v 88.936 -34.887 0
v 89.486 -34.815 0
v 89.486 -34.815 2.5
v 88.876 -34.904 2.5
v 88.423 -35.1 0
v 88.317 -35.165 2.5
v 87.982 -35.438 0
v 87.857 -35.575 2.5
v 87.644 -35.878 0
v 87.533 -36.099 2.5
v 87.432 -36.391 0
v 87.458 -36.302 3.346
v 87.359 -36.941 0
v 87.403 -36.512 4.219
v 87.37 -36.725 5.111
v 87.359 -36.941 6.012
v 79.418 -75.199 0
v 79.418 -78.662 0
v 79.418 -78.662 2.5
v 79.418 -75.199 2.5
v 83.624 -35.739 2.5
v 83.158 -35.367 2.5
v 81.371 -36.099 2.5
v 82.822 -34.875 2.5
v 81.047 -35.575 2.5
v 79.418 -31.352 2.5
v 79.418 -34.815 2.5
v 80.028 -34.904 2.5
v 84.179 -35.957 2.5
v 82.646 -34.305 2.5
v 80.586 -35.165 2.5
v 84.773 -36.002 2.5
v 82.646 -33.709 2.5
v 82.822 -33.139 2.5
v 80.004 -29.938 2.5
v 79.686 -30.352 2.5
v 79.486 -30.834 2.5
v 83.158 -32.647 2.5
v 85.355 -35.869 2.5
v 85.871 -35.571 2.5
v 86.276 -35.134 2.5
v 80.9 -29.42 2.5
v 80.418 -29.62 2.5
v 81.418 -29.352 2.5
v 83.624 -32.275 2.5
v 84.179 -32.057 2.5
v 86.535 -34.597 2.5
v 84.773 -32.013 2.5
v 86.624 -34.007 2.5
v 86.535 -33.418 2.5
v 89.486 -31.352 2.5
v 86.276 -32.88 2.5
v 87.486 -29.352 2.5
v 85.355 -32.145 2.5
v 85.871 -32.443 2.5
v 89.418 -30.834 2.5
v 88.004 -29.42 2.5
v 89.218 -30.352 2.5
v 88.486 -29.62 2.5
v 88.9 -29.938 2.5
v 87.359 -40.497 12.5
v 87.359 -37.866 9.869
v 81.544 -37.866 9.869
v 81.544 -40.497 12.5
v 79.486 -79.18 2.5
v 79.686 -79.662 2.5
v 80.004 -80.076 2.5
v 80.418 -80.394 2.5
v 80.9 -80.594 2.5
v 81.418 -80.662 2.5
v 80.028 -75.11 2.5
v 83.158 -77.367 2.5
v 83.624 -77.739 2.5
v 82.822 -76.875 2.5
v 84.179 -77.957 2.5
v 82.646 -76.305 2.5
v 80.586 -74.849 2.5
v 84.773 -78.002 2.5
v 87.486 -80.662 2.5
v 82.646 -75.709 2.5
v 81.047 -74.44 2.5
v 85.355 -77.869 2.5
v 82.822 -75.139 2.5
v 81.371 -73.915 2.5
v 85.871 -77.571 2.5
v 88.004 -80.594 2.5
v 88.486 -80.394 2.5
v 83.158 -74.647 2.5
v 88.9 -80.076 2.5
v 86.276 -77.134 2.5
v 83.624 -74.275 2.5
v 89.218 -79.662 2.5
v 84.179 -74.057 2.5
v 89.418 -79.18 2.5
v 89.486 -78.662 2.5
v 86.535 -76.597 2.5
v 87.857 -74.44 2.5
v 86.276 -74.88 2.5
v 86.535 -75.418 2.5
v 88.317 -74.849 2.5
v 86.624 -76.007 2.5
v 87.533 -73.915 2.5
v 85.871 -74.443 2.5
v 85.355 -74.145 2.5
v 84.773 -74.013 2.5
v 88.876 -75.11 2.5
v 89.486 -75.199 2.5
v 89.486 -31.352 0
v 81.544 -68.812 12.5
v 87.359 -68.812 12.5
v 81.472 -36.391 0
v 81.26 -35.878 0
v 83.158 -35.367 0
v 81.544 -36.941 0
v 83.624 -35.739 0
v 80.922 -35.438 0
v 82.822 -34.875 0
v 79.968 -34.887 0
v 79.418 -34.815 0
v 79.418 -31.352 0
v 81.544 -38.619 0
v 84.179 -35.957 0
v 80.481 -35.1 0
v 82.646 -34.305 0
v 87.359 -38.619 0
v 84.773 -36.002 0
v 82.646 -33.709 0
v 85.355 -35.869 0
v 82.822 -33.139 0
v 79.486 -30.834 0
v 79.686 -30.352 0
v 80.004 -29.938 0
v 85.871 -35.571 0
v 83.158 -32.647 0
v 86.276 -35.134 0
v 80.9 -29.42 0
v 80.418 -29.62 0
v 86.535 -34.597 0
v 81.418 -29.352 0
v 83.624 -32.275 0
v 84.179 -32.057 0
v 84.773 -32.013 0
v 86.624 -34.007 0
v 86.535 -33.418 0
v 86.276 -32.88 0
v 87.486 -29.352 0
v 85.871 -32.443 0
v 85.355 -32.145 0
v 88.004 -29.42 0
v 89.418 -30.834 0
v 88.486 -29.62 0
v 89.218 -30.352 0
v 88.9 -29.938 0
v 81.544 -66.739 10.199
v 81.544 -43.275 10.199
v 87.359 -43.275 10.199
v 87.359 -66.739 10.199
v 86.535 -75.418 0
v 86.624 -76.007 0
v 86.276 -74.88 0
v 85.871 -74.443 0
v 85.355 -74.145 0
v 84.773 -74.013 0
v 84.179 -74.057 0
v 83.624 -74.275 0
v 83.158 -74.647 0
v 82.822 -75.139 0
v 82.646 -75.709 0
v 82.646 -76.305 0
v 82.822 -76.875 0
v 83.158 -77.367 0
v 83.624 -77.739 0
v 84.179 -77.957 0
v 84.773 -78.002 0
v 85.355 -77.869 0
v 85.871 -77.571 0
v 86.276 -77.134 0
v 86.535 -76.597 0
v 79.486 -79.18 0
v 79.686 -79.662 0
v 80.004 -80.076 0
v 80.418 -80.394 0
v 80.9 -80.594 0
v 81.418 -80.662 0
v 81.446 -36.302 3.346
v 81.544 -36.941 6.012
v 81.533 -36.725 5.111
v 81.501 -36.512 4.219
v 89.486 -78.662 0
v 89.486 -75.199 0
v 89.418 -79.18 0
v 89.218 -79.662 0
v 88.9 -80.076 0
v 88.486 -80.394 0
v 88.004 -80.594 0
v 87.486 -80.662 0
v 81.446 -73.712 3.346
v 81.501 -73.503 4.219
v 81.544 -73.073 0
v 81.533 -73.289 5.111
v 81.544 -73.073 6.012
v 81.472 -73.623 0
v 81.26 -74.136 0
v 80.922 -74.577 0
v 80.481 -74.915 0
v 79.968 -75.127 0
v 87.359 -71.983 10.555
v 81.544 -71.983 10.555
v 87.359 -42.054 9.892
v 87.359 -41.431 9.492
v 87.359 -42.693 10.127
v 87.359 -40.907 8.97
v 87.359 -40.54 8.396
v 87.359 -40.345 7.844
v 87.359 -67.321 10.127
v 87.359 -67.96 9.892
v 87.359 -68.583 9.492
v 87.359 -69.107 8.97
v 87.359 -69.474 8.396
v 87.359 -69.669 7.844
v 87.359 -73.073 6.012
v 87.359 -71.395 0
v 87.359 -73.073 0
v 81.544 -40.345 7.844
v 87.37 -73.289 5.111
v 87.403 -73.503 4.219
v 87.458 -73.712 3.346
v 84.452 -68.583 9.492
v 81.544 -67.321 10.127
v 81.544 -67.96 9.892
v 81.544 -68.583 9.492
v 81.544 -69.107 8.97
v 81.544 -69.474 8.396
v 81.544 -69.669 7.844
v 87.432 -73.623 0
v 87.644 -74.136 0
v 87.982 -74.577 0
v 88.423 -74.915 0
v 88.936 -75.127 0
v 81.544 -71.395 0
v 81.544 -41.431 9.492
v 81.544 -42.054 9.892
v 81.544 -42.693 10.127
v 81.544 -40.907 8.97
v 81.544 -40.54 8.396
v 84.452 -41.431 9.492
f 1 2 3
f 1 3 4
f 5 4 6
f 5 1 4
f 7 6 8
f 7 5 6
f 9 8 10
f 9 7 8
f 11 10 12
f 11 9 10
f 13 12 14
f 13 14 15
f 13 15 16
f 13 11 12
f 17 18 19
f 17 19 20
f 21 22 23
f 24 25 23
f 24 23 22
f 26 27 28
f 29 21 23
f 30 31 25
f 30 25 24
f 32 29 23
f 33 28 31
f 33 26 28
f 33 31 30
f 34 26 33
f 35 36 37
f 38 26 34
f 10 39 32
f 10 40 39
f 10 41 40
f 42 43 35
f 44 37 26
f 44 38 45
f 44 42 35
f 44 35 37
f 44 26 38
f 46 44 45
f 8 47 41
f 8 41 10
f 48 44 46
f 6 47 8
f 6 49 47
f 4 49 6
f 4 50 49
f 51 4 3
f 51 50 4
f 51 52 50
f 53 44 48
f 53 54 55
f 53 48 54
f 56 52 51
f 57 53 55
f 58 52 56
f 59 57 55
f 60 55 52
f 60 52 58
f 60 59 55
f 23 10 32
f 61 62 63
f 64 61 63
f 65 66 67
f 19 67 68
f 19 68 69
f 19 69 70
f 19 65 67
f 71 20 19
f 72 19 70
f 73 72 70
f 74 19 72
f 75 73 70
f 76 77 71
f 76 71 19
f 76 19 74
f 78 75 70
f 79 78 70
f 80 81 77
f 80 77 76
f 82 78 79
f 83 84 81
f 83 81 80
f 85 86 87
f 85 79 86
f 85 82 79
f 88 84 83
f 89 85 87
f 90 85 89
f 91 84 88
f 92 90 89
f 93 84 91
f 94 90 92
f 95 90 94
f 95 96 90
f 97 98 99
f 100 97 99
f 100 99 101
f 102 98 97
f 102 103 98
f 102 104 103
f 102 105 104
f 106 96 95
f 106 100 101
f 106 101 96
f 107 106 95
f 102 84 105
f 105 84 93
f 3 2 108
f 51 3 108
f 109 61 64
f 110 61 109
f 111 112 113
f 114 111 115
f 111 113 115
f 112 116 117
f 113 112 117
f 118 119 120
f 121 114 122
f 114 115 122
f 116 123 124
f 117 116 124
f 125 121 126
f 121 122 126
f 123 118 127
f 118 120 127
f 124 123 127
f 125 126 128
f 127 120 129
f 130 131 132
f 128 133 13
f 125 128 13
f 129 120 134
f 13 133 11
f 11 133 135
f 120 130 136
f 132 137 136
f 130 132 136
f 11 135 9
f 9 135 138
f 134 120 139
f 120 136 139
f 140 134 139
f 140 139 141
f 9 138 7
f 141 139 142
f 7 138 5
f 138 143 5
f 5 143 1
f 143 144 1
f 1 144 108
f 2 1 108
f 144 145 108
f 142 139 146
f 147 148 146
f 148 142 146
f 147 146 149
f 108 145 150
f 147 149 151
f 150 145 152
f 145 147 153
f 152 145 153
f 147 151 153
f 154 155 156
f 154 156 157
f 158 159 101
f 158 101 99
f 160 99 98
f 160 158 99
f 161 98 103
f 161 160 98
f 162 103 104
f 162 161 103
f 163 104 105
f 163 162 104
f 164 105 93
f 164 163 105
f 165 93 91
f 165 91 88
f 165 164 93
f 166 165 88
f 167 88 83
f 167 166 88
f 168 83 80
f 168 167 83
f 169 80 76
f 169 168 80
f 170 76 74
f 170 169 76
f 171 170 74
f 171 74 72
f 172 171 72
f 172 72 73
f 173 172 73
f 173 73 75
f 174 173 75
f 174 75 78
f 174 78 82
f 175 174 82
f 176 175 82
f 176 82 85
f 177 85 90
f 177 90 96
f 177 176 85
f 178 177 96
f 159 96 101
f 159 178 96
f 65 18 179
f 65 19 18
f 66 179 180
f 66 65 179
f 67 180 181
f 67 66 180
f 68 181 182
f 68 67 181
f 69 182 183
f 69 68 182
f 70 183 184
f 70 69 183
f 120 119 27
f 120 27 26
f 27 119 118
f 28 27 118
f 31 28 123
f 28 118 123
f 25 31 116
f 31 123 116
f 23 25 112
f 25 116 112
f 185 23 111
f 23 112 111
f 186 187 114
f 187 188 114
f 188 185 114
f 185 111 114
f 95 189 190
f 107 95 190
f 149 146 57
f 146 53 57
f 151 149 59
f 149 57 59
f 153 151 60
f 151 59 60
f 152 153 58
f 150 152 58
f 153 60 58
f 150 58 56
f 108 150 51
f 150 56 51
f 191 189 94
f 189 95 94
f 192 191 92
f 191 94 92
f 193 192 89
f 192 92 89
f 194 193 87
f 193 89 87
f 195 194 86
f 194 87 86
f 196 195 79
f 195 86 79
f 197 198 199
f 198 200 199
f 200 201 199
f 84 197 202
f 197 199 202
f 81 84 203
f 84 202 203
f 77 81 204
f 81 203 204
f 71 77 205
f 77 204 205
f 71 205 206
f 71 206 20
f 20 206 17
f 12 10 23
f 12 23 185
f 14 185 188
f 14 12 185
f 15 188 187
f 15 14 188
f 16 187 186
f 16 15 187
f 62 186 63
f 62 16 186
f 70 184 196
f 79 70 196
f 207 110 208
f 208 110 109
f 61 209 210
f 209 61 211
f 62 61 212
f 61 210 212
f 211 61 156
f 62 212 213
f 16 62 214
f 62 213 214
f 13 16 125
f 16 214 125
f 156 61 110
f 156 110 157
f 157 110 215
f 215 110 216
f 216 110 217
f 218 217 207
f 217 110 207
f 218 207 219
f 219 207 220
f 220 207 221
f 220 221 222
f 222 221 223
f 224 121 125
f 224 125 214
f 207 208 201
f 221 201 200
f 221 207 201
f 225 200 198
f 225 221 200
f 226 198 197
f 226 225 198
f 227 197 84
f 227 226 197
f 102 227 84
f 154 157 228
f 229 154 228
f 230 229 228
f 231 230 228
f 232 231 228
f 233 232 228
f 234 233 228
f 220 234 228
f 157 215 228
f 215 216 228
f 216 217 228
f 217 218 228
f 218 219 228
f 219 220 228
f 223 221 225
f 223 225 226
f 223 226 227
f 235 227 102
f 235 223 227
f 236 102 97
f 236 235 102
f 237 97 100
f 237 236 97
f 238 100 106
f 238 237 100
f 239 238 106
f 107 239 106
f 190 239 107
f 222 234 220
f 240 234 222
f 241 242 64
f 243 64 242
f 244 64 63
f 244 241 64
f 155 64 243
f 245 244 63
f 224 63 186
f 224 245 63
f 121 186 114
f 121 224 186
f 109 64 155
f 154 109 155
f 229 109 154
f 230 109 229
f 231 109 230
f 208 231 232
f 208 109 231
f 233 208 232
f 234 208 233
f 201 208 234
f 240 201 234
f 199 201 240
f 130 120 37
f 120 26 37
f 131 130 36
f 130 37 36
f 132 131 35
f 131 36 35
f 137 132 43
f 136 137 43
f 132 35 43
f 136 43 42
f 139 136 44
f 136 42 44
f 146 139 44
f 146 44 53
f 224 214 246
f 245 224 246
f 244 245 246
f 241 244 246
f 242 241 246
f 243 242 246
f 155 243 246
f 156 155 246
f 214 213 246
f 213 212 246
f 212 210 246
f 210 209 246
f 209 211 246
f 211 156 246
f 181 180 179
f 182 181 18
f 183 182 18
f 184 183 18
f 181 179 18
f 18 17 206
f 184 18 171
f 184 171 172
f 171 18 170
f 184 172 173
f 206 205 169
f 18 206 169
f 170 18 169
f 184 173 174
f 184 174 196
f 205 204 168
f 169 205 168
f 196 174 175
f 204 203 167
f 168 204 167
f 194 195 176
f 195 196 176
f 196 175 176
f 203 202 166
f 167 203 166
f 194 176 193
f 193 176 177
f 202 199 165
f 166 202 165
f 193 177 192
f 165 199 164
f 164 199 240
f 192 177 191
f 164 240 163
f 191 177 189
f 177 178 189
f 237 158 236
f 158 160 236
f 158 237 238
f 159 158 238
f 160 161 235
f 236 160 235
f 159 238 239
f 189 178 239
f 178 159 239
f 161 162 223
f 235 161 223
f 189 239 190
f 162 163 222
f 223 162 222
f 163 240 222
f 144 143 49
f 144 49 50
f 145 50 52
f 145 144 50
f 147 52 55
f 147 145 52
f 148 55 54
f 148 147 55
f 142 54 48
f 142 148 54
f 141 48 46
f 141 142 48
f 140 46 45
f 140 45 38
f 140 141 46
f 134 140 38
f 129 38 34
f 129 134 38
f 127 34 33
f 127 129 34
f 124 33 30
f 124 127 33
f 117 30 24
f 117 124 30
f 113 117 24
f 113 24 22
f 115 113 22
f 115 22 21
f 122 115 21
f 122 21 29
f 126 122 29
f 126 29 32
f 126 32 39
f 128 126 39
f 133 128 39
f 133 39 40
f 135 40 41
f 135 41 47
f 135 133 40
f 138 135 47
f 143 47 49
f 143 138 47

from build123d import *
from OCP.BRepFilletAPI import BRepFilletAPI_MakeChamfer

# Parameters (mm, degrees)
SKETCH_1_W               = 10.068208361
SKETCH_1_H               = 51.310344827
SKETCH_1_R               = 2
EXTRUDE_1_DEPTH          = 2.5
EXTRUDE_2_DEPTH          = 10.068208362
CUT_EXTRUDE_1_DEPTH      = 83.243670079
CUT_EXTRUDE_1_DEPTH_BACK = 83.243670079
CUT_EXTRUDE_2_DEPTH      = 122.121367623
CUT_EXTRUDE_2_DEPTH_BACK = 122.121367623
FILLET_2_R               = 2
CHAMFER_2_SIZE           = 2
CHAMFER_2_SIZE2          = 2.70532723


with BuildPart() as part:
    # 草图1 → 凸台-拉伸1 (new body)
    with BuildSketch(Plane.XY):
        with Locations((84.451834639, -55.007101597)):
            Rectangle(SKETCH_1_W, SKETCH_1_H)
        with Locations((84.623869854, -34.007101596)):
            Circle(SKETCH_1_R, mode=Mode.SUBTRACT)
        with Locations((84.623869854, -76.007101596)):
            Circle(SKETCH_1_R, mode=Mode.SUBTRACT)
    extrude(amount=EXTRUDE_1_DEPTH)

    # 草图2 → 凸台-拉伸2 (add)
    with BuildSketch(Plane(origin=(89.485938819, 0, 0), x_dir=(0, 0, -1), z_dir=(1, 0, 0))):
        Polygon((-12.5, -71.517171054), (-2.5, -73.914822505), (-2.5, -36.099380688), (-12.5, -38.497032139), align=None)
    extrude(amount=-EXTRUDE_2_DEPTH)

    # 草图3 → 切除-拉伸1 (cut, two sides: drawn at the far end of the back side and taken through both)
    with BuildSketch(Plane(origin=(89.485938819, 0, 0), x_dir=(0, 0, -1), z_dir=(1, 0, 0)).offset(-CUT_EXTRUDE_1_DEPTH_BACK)):
        Polygon((-10.198786391, -69.151033694), (0, -71.395312685), (0, -38.618890508), (-10.198786391, -40.863169498), align=None)
    extrude(amount=CUT_EXTRUDE_1_DEPTH + CUT_EXTRUDE_1_DEPTH_BACK, mode=Mode.SUBTRACT)

    # 草图4 → 切除-拉伸2 (cut, two sides: drawn at the far end of the back side and taken through both)
    with BuildSketch(Plane.XY.offset(12.5).offset(-CUT_EXTRUDE_2_DEPTH_BACK)):
        with BuildLine():
            Line((81.544440974, -36.941486908), (81.544440974, -73.072716285))
            ThreePointArc((81.544440974, -73.072716285), (79.417730458, -75.199426802), (77.291019941, -73.072716285))
            Line((77.291019941, -73.072716285), (77.291019941, -36.941486908))
            ThreePointArc((77.291019941, -36.941486908), (79.417730458, -34.814776391), (81.544440974, -36.941486908))
        make_face()
        with BuildLine():
            Line((87.359228302, -36.941486908), (87.359228302, -73.072716285))
            ThreePointArc((87.359228302, -73.072716285), (89.485938819, -75.199426802), (91.612649336, -73.072716285))
            Line((91.612649336, -73.072716285), (91.612649336, -36.941486908))
            ThreePointArc((91.612649336, -36.941486908), (89.485938819, -34.814776391), (87.359228302, -36.941486908))
        make_face()
    extrude(amount=CUT_EXTRUDE_2_DEPTH + CUT_EXTRUDE_2_DEPTH_BACK, mode=Mode.SUBTRACT)

    # 圆角1
    # a fillet whose section is not a circle: 3 mm, written as the material it adds along each edge
    with BuildSketch(Plane(origin=(87.359228302, -40.863169498, 10.198786391), x_dir=(0, 0.2149116520268582, -0.9766334941128564), z_dir=(-1, 0, 0)), Plane(origin=(87.359228302, -69.151033694, 10.198786391), x_dir=(0, 1, 0), z_dir=(-1, 0, 0))) as fillet_1_piece_1:
        with BuildLine():
            Bezier((2.411616085, 0), (0, 0), (-0.518284397, 2.355265044), weights=[1, 0.666666667, 1])
            Line((-0.518284397, 2.355265044), (0, 0))
            Line((0, 0), (2.411616085, 0))
        make_face()
    extrude(amount=5.814787328)

    # 圆角2
    fillet_2_edges = [part.edges().sort_by_distance(p)[0] for p in [
        (89.485938819, -80.66227401, 1.25),
        (79.417730458, -80.66227401, 1.25),
        (79.417730458, -29.351929183, 1.25),
        (89.485938819, -29.351929183, 1.25),
    ]]
    fillet(fillet_2_edges, radius=FILLET_2_R)

    # 倒角2: one chamfer whose edges measure the first distance from different faces: ONE call of the kernel's chamfer builder (chamfer() names one face for all edges)
    chamfer_2_edges_1 = [part.edges().sort_by_distance(p)[0] for p in [
        (84.451834638, -71.517171054, 12.5),
    ]]
    chamfer_2_side_1 = [part.faces().sort_by_distance(p)[0] for p in [
        (84.451834638, -72.722762821, 7.471780545),
    ]]
    chamfer_2_edges_2 = [part.edges().sort_by_distance(p)[0] for p in [
        (84.451834638, -38.497032139, 12.5),
    ]]
    chamfer_2_side_2 = [part.faces().sort_by_distance(p)[0] for p in [
        (84.451834638, -55.007101596, 12.5),
    ]]
    chamfer_2 = BRepFilletAPI_MakeChamfer(part.part.solid().wrapped)
    for e in chamfer_2_edges_1:
        chamfer_2.Add(CHAMFER_2_SIZE, CHAMFER_2_SIZE2, e.wrapped, chamfer_2_side_1[0].wrapped)  # the first distance lies on this face
    for e in chamfer_2_edges_2:
        chamfer_2.Add(CHAMFER_2_SIZE, CHAMFER_2_SIZE2, e.wrapped, chamfer_2_side_2[0].wrapped)  # the first distance lies on this face
    add(Compound.cast(chamfer_2.Shape()), mode=Mode.REPLACE)


solid = part.part
